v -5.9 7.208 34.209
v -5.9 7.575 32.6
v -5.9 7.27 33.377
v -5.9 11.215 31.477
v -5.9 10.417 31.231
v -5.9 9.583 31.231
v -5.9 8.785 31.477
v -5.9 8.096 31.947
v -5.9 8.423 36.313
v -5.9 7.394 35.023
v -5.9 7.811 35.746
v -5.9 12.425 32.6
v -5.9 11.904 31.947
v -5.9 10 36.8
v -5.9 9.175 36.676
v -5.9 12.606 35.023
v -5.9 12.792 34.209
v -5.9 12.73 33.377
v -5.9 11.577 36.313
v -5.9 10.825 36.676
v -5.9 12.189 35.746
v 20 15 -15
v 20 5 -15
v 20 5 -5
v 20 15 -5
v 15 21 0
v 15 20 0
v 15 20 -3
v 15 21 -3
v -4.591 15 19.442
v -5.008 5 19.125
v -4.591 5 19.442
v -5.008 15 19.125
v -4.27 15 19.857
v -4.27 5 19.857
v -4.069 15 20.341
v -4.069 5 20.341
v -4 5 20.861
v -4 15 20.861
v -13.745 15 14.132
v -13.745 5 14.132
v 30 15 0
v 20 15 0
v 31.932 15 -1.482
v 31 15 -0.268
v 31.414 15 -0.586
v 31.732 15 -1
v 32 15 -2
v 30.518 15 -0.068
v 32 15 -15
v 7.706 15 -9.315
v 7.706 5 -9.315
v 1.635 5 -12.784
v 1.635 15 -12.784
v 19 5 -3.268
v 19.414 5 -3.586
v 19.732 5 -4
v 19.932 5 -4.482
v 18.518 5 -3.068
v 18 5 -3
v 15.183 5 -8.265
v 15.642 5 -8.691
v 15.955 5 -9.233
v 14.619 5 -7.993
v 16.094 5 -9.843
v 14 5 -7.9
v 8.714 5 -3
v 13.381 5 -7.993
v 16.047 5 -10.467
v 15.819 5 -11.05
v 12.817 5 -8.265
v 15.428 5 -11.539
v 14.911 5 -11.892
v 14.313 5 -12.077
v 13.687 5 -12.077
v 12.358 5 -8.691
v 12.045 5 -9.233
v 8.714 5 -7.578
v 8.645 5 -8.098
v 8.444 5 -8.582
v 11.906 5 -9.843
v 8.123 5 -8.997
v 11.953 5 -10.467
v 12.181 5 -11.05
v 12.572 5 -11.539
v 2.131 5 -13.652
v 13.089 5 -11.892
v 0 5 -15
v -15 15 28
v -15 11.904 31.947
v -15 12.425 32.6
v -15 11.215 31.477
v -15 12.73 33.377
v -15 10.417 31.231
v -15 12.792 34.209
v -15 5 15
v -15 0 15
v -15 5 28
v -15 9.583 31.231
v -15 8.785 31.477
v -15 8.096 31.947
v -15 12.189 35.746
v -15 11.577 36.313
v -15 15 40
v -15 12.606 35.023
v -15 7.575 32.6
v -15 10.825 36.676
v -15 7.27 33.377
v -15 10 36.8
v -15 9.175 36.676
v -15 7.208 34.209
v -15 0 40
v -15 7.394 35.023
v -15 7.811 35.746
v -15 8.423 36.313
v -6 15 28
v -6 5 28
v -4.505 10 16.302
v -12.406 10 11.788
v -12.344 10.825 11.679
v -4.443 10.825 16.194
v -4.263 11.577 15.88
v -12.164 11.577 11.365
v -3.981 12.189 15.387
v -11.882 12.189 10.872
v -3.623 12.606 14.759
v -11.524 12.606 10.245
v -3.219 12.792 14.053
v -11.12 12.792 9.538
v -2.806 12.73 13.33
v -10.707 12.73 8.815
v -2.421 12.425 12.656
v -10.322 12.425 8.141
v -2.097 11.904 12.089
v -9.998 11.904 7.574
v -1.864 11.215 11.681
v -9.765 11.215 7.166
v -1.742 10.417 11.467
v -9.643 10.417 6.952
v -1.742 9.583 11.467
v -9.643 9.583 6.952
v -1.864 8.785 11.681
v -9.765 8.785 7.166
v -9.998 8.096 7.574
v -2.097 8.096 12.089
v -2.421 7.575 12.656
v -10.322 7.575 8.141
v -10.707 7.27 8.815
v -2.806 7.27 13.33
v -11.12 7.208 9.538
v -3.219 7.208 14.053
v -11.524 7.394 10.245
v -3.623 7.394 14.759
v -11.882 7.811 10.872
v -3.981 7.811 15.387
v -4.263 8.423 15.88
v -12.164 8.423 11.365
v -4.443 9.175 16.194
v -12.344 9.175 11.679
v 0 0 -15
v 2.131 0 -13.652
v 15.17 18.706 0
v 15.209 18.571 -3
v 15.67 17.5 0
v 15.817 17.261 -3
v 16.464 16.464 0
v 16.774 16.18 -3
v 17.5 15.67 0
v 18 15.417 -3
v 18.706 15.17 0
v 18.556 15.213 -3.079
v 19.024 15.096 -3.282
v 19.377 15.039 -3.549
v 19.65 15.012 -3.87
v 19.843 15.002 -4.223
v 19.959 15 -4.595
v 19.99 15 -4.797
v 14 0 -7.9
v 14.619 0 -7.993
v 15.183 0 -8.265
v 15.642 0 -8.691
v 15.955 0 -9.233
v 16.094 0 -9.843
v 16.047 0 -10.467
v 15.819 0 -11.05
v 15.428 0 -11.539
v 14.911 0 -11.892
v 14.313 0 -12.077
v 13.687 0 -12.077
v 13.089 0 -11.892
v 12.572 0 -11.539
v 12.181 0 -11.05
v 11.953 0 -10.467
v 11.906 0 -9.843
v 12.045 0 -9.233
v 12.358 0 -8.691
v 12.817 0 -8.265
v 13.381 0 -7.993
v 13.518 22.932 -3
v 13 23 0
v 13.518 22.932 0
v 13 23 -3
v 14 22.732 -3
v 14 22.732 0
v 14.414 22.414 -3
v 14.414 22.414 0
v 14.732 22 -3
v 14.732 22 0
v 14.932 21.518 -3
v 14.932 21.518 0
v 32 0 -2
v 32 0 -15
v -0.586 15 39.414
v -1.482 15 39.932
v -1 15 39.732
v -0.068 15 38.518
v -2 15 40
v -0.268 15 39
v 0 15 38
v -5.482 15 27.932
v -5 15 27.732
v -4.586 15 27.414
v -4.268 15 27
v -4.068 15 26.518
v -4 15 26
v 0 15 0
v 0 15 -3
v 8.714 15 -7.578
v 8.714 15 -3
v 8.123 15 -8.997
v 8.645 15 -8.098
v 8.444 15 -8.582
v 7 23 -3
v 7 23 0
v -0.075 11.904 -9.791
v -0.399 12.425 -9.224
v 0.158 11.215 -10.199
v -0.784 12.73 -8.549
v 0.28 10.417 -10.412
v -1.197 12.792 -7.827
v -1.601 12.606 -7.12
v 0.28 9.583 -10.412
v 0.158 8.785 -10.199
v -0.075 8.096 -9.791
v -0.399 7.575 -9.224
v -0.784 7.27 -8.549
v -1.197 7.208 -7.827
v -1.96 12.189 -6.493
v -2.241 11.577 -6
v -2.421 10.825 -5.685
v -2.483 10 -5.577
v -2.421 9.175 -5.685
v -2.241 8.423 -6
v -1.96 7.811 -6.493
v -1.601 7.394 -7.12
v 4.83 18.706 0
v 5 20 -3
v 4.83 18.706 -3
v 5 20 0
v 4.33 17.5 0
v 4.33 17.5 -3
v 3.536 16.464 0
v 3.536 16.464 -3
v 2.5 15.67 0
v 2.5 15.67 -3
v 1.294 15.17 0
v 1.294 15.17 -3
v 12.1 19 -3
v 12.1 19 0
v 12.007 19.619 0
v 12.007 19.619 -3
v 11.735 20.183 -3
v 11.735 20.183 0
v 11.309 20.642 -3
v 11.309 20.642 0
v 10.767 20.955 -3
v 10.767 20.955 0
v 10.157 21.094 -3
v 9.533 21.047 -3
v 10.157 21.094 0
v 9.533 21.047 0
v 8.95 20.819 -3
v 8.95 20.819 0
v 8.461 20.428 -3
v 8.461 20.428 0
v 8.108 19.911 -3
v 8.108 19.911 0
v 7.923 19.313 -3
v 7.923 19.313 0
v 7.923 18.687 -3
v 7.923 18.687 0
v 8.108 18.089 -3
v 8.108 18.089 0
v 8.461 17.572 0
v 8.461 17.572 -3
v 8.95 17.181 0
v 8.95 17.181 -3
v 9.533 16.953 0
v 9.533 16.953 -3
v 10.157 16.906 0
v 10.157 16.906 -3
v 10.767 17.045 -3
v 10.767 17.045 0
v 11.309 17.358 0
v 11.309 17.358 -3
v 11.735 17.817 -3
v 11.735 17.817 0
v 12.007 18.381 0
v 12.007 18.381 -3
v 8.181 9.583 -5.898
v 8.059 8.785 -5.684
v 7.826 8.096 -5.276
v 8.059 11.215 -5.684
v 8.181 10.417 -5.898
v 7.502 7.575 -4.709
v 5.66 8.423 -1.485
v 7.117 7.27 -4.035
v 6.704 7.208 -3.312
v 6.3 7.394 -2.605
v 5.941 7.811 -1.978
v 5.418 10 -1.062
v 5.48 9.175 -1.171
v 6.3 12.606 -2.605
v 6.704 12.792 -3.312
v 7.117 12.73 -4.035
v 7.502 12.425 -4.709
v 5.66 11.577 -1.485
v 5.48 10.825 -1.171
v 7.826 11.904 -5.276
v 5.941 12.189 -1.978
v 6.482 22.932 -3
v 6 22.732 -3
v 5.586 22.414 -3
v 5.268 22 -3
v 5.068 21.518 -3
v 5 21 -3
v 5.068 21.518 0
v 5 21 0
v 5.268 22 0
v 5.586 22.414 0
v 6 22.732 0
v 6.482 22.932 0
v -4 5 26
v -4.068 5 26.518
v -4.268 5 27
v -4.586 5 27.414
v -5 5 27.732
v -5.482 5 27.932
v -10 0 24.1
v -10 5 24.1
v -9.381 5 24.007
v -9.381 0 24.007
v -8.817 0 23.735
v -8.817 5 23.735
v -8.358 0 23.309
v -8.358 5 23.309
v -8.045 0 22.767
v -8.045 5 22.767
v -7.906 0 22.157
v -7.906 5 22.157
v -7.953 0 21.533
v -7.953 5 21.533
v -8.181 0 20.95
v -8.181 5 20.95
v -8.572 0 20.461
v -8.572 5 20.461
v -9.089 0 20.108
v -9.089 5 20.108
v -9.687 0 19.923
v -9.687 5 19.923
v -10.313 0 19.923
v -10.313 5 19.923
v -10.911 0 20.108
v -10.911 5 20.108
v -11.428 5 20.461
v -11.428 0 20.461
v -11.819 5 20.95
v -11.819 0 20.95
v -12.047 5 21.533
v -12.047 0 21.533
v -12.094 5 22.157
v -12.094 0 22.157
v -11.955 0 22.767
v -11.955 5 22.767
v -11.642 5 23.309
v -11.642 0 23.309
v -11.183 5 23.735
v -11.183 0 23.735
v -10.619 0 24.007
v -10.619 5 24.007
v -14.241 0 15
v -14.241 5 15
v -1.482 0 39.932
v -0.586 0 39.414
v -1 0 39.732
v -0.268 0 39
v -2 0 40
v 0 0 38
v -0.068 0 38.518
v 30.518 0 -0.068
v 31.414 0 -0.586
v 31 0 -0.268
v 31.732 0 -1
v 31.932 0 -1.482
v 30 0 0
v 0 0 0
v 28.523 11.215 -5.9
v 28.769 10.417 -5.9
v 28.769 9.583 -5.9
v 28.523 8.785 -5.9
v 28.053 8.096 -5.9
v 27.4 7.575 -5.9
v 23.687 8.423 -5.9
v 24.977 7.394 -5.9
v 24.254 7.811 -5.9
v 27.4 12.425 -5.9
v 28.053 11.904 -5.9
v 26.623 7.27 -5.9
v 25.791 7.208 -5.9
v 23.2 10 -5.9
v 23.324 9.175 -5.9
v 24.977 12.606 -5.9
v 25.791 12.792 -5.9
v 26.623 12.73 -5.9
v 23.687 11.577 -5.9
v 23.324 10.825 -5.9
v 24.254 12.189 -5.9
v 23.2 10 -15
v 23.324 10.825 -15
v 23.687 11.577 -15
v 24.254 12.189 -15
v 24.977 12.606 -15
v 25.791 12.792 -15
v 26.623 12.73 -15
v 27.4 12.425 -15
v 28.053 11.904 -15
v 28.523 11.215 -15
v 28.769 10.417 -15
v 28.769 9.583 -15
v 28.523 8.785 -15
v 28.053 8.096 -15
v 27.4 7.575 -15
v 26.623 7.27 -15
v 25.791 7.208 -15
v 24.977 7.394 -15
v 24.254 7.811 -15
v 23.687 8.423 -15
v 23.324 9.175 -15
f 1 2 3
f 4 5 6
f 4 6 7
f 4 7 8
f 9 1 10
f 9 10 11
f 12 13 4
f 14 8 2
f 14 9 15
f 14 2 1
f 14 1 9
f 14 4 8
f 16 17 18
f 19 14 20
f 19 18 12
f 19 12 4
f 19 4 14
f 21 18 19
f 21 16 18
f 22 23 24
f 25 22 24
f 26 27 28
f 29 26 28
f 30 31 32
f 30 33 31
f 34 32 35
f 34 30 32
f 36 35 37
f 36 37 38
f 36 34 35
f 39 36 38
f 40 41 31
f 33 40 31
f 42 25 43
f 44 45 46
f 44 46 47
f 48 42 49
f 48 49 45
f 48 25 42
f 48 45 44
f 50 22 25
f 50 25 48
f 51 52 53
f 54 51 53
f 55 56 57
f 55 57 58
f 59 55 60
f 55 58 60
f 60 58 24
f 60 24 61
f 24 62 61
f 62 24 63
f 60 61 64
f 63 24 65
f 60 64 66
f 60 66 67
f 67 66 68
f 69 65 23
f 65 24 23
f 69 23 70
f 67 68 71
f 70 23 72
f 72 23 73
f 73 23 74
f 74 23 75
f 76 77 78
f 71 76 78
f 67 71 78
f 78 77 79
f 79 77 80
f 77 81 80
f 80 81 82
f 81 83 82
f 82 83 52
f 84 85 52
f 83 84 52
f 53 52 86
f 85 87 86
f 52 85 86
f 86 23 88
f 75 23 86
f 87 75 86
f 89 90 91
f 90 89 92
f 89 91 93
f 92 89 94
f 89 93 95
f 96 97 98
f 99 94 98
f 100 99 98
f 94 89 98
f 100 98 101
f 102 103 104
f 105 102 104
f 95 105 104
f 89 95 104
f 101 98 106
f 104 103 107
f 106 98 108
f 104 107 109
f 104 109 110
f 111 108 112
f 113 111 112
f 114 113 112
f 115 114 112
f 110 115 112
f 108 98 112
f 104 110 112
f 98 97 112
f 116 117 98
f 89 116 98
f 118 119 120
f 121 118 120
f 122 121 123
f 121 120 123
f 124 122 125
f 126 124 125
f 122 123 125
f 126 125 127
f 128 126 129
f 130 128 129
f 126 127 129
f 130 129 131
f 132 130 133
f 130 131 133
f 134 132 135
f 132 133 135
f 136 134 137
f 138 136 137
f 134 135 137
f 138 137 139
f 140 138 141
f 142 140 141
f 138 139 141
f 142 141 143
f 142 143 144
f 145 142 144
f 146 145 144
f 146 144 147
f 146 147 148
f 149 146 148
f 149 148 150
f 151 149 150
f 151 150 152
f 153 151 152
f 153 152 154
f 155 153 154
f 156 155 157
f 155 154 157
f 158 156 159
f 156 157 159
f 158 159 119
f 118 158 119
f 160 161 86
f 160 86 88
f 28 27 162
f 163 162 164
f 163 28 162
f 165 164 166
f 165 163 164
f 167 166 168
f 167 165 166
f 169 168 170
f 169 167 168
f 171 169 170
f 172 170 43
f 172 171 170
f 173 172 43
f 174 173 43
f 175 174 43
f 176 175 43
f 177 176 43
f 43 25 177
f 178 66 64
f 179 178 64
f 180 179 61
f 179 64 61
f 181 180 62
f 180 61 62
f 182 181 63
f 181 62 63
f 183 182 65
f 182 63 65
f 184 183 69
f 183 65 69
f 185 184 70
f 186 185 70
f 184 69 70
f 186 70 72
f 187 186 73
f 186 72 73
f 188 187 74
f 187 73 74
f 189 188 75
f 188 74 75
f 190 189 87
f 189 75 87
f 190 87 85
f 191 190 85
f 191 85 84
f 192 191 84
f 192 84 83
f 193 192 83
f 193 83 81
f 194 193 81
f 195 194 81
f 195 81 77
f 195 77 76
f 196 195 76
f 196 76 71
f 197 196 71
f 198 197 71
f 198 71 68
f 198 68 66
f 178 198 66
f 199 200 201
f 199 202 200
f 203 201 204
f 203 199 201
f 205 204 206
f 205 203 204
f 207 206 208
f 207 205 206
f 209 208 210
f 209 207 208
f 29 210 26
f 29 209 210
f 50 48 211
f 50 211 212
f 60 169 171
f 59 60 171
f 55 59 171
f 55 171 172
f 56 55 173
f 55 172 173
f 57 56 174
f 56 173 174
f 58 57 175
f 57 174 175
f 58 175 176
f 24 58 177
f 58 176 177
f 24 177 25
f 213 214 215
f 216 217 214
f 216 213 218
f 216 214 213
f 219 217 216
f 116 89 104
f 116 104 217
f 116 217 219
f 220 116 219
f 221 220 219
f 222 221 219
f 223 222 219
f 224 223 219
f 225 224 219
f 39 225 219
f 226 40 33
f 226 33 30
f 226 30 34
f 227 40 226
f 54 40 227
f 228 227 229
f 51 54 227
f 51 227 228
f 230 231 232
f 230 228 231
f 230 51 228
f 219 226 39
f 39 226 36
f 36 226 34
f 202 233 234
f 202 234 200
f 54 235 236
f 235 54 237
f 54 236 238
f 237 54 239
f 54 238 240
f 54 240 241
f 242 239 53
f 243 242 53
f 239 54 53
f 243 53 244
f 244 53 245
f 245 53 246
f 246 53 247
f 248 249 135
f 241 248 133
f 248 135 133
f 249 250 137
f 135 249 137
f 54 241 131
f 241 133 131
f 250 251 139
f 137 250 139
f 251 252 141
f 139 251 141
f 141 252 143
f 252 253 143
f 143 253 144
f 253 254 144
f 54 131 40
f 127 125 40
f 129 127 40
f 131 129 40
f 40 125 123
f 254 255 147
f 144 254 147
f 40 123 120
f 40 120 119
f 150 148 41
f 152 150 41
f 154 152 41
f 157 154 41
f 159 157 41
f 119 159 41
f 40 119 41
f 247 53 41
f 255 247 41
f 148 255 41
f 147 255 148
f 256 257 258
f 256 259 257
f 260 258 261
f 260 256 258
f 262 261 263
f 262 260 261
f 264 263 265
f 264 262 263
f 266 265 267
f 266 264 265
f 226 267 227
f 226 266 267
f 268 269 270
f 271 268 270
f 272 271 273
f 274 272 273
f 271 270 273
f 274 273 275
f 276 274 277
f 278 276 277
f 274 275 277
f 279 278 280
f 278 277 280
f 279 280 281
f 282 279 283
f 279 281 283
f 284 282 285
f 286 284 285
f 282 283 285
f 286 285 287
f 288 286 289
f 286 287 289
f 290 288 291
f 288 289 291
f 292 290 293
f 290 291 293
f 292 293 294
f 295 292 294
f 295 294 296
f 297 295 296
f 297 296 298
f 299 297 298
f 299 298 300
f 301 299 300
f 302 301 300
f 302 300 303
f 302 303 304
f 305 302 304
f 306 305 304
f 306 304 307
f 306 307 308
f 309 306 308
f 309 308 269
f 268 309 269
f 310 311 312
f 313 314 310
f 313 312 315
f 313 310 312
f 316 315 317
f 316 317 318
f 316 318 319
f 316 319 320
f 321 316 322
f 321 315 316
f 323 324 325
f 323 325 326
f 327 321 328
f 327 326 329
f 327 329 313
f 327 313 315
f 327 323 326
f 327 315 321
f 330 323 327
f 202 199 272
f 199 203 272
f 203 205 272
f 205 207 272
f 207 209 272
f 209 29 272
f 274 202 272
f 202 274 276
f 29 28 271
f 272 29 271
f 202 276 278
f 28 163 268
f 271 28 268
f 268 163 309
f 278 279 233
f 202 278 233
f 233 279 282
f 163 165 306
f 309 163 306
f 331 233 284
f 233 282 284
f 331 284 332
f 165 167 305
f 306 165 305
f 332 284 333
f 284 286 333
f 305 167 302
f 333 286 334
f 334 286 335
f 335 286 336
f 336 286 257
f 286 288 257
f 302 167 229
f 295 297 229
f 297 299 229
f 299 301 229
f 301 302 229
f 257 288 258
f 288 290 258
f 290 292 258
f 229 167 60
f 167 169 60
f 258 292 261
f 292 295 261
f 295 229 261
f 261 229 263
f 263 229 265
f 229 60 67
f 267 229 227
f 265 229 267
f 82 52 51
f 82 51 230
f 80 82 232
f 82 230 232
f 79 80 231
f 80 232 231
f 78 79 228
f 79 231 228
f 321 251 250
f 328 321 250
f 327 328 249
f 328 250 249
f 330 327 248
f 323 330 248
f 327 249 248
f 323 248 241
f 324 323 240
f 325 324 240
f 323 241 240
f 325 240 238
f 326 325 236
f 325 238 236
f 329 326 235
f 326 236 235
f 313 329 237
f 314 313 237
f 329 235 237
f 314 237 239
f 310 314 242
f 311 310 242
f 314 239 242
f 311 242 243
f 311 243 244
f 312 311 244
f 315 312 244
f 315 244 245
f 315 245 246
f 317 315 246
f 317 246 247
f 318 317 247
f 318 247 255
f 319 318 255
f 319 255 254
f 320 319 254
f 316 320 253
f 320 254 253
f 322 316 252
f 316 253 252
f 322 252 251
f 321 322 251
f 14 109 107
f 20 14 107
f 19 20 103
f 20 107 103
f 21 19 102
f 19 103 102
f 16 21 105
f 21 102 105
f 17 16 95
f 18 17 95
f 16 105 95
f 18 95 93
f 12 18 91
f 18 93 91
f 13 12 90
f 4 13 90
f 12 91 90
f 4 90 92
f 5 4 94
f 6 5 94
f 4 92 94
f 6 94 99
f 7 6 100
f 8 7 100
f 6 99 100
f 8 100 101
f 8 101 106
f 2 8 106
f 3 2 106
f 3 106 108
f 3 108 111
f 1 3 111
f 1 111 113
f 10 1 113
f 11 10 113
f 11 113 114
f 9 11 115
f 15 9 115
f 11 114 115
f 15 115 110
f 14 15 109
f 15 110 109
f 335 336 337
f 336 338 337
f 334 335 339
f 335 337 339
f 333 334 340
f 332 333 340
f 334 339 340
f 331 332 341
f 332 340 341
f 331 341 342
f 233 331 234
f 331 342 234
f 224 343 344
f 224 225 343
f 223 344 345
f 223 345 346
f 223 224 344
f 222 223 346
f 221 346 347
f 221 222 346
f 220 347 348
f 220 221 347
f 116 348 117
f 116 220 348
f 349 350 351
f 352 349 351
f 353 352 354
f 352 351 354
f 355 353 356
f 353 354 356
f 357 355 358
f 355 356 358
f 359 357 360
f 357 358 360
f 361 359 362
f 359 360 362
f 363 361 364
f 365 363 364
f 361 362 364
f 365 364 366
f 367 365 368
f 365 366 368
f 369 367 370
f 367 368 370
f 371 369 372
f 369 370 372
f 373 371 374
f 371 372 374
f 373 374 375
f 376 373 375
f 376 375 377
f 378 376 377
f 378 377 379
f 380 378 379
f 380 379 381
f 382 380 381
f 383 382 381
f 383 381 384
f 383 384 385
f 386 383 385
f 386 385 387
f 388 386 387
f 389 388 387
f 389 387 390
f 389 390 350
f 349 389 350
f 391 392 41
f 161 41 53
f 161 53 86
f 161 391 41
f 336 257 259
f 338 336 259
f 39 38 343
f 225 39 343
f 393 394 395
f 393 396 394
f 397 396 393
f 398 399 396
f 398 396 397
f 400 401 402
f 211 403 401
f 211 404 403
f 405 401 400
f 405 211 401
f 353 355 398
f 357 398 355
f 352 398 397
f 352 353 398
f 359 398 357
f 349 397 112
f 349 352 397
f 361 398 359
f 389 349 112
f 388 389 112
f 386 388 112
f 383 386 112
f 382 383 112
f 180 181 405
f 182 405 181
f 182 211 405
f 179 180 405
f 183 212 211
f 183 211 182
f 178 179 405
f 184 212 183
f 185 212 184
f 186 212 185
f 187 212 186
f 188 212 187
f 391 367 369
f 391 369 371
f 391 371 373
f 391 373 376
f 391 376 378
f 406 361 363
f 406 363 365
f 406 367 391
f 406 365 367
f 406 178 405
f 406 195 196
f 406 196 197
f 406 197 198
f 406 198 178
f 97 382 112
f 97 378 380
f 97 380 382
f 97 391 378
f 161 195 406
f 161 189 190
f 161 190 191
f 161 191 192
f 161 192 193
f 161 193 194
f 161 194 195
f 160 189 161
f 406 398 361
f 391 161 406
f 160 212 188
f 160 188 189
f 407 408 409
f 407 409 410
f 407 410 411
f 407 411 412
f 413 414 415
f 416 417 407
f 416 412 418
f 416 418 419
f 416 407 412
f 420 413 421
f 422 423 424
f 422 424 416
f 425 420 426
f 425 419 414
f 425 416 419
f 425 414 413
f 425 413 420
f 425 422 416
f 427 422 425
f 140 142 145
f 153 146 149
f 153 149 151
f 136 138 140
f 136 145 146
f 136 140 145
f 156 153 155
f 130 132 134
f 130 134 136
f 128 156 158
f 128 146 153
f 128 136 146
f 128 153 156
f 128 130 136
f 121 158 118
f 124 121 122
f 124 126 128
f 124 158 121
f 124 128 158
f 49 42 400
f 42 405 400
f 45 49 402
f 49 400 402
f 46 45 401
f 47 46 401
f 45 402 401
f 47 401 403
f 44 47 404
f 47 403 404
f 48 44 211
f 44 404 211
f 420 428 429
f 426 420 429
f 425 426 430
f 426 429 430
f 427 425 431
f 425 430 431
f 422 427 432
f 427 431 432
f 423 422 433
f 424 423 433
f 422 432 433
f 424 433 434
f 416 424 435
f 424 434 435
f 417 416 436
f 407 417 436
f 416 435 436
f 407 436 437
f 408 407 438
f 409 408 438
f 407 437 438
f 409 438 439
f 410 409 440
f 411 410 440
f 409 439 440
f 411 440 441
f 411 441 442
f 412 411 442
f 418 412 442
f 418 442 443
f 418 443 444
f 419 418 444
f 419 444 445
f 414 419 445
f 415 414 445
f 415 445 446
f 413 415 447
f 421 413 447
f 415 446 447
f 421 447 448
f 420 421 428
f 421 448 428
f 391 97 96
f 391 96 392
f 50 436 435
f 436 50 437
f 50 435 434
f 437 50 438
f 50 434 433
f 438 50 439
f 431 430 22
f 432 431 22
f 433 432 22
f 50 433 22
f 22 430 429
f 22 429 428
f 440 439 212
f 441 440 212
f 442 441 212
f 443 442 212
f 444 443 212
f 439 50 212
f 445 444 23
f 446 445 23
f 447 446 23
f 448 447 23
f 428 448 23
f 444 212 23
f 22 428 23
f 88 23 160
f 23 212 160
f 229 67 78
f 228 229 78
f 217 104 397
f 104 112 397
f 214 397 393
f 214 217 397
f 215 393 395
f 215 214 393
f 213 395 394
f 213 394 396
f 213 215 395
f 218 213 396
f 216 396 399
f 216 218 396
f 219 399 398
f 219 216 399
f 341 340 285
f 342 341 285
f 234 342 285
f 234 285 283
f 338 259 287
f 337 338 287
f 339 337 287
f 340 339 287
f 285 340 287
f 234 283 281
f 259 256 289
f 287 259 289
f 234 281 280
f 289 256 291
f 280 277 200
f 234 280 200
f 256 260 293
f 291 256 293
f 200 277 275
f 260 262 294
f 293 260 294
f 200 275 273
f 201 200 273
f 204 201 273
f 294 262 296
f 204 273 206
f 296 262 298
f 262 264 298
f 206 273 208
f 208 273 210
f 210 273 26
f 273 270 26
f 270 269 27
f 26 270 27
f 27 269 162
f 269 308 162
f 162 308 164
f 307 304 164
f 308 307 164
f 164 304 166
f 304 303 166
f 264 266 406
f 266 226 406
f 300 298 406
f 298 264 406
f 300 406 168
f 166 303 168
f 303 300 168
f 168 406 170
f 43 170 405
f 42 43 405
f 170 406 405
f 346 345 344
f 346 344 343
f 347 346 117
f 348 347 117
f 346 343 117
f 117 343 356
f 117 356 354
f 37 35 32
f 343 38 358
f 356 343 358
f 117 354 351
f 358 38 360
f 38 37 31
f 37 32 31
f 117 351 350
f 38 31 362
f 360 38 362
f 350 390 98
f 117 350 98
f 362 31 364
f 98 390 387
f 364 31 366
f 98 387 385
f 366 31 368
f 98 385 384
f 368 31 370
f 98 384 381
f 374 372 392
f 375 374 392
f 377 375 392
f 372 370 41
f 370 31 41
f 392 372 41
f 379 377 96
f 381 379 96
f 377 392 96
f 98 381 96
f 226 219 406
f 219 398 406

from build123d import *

# Parameters (mm, degrees)
BOSS_EXTRU_1_DEPTH      = 5
BOSS_EXTRU_2_DEPTH      = 10
ESQUISSE4_R             = 2.8
ENL_V_MAT_EXTRU_1_DEPTH = 9.1
ESQUISSE5_R             = 2.8
ENL_V_MAT_EXTRU_2_DEPTH = 9.1
ESQUISSE6_R             = 2.8
ENL_V_MAT_EXTRU_3_DEPTH = 9.1
BOSS_EXTRU_3_DEPTH      = 8
ESQUISSE8_R             = 2.1
ENL_V_MAT_EXTRU_5_DEPTH = 9.1
ESQUISSE9_R             = 2.1
ENL_V_MAT_EXTRU_6_DEPTH = 14
CONG_2_R                = 5
CONG_1_R                = 2


with BuildPart() as part:
    # Esquisse2 → Boss.-Extru.1 (new body)
    with BuildSketch(Plane(origin=(0, 0, 0), x_dir=(1, 0, 0), z_dir=(0, 1, 0))):
        Polygon((20, 0), (0, 0), (0, -20), (0, -40), (-15, -40), (-15, -15), (-14.241244466, -15), (2.1313405, 13.65202369), (0, 15), (32, 15), (32, 0), align=None)
    extrude(amount=BOSS_EXTRU_1_DEPTH)

    # Esquisse3 → Boss.-Extru.2 (add)
    with BuildSketch(Plane(origin=(0, 5, 0), x_dir=(1, 0, 0), z_dir=(0, 1, 0))):
        Polygon((32, 15), (20, 15), (20, 3), (8.713731996, 3), (8.713731996, 8.738906014), (1.635201562, 12.783780548), (-13.745105527, -14.131756858), (-4, -19.700388588), (-4, -28), (-15, -28), (-15, -40), (0, -40), (0, 0), (32, 0), align=None)
    extrude(amount=BOSS_EXTRU_2_DEPTH)

    # Esquisse4 → Enlèv. mat.-Extru.1 (cut)
    with BuildSketch(Plane(origin=(-4.274168905, 0, -2.442382231), x_dir=(-0.4961389383568338, 0, 0.8682431421244592), z_dir=(-0.8682431421244592, 0, -0.4961389383568338))):
        with Locations((-6.410716958, 10)):
            Circle(ESQUISSE4_R)
        with Locations((13.589283042, 10)):
            Circle(ESQUISSE4_R)
    extrude(amount=-ENL_V_MAT_EXTRU_1_DEPTH, mode=Mode.SUBTRACT)

    # Esquisse5 → Enlèv. mat.-Extru.2 (cut)
    with BuildSketch(Plane.ZY.offset(15)):
        with Locations((34, 10)):
            Circle(ESQUISSE5_R)
    extrude(amount=-ENL_V_MAT_EXTRU_2_DEPTH, mode=Mode.SUBTRACT)

    # Esquisse6 → Enlèv. mat.-Extru.3 (cut)
    with BuildSketch(Plane(origin=(0, 0, -15), x_dir=(-1, 0, 0), z_dir=(0, 0, -1))):
        with Locations((-26, 10)):
            Circle(ESQUISSE6_R)
    extrude(amount=-ENL_V_MAT_EXTRU_3_DEPTH, mode=Mode.SUBTRACT)

    # Esquisse10 → Boss.-Extru.3 (add)
    with BuildSketch(Plane(origin=(0, 15, 0), x_dir=(1, 0, 0), z_dir=(0, 1, 0))):
        Polygon((15, 3), (8.713731996, 3), (5, 3), (5, 0), (15, 0), align=None)
    extrude(amount=BOSS_EXTRU_3_DEPTH)

    # Esquisse8 → Enlèv. mat.-Extru.5 (cut)
    with BuildSketch(Plane.XY):
        with Locations((10, 19)):
            Circle(ESQUISSE8_R)
    extrude(amount=-ENL_V_MAT_EXTRU_5_DEPTH, mode=Mode.SUBTRACT)

    # Esquisse9 → Enlèv. mat.-Extru.6 (cut)
    with BuildSketch(Plane(origin=(0, 5, 0), x_dir=(1, 0, 0), z_dir=(0, 1, 0))):
        with Locations(Location((-10, -22, 0), (0, 0, 270))):
            Circle(ESQUISSE9_R)
        with Locations(Location((14, 10, 0), (0, 0, 270))):
            Circle(ESQUISSE9_R)
    extrude(amount=-ENL_V_MAT_EXTRU_6_DEPTH, mode=Mode.SUBTRACT)

    # Congé2
    cong_2_edges = [part.edges().sort_by_distance(p)[0] for p in [
        (15, 15, -1.5),
        (5, 15, -1.5),
    ]]
    fillet(cong_2_edges, radius=CONG_2_R)

    # Congé1
    cong_1_edges = [part.edges().sort_by_distance(p)[0] for p in [
        (15, 23, -1.5),
        (5, 23, -1.5),
        (32, 7.5, 0),
        (0, 7.5, 40),
        (20, 10, -3),
        (8.713731996, 10, -8.738906014),
        (-4, 10, 19.700388588),
        (-4, 10, 28),
    ]]
    fillet(cong_1_edges, radius=CONG_1_R)


solid = part.part
